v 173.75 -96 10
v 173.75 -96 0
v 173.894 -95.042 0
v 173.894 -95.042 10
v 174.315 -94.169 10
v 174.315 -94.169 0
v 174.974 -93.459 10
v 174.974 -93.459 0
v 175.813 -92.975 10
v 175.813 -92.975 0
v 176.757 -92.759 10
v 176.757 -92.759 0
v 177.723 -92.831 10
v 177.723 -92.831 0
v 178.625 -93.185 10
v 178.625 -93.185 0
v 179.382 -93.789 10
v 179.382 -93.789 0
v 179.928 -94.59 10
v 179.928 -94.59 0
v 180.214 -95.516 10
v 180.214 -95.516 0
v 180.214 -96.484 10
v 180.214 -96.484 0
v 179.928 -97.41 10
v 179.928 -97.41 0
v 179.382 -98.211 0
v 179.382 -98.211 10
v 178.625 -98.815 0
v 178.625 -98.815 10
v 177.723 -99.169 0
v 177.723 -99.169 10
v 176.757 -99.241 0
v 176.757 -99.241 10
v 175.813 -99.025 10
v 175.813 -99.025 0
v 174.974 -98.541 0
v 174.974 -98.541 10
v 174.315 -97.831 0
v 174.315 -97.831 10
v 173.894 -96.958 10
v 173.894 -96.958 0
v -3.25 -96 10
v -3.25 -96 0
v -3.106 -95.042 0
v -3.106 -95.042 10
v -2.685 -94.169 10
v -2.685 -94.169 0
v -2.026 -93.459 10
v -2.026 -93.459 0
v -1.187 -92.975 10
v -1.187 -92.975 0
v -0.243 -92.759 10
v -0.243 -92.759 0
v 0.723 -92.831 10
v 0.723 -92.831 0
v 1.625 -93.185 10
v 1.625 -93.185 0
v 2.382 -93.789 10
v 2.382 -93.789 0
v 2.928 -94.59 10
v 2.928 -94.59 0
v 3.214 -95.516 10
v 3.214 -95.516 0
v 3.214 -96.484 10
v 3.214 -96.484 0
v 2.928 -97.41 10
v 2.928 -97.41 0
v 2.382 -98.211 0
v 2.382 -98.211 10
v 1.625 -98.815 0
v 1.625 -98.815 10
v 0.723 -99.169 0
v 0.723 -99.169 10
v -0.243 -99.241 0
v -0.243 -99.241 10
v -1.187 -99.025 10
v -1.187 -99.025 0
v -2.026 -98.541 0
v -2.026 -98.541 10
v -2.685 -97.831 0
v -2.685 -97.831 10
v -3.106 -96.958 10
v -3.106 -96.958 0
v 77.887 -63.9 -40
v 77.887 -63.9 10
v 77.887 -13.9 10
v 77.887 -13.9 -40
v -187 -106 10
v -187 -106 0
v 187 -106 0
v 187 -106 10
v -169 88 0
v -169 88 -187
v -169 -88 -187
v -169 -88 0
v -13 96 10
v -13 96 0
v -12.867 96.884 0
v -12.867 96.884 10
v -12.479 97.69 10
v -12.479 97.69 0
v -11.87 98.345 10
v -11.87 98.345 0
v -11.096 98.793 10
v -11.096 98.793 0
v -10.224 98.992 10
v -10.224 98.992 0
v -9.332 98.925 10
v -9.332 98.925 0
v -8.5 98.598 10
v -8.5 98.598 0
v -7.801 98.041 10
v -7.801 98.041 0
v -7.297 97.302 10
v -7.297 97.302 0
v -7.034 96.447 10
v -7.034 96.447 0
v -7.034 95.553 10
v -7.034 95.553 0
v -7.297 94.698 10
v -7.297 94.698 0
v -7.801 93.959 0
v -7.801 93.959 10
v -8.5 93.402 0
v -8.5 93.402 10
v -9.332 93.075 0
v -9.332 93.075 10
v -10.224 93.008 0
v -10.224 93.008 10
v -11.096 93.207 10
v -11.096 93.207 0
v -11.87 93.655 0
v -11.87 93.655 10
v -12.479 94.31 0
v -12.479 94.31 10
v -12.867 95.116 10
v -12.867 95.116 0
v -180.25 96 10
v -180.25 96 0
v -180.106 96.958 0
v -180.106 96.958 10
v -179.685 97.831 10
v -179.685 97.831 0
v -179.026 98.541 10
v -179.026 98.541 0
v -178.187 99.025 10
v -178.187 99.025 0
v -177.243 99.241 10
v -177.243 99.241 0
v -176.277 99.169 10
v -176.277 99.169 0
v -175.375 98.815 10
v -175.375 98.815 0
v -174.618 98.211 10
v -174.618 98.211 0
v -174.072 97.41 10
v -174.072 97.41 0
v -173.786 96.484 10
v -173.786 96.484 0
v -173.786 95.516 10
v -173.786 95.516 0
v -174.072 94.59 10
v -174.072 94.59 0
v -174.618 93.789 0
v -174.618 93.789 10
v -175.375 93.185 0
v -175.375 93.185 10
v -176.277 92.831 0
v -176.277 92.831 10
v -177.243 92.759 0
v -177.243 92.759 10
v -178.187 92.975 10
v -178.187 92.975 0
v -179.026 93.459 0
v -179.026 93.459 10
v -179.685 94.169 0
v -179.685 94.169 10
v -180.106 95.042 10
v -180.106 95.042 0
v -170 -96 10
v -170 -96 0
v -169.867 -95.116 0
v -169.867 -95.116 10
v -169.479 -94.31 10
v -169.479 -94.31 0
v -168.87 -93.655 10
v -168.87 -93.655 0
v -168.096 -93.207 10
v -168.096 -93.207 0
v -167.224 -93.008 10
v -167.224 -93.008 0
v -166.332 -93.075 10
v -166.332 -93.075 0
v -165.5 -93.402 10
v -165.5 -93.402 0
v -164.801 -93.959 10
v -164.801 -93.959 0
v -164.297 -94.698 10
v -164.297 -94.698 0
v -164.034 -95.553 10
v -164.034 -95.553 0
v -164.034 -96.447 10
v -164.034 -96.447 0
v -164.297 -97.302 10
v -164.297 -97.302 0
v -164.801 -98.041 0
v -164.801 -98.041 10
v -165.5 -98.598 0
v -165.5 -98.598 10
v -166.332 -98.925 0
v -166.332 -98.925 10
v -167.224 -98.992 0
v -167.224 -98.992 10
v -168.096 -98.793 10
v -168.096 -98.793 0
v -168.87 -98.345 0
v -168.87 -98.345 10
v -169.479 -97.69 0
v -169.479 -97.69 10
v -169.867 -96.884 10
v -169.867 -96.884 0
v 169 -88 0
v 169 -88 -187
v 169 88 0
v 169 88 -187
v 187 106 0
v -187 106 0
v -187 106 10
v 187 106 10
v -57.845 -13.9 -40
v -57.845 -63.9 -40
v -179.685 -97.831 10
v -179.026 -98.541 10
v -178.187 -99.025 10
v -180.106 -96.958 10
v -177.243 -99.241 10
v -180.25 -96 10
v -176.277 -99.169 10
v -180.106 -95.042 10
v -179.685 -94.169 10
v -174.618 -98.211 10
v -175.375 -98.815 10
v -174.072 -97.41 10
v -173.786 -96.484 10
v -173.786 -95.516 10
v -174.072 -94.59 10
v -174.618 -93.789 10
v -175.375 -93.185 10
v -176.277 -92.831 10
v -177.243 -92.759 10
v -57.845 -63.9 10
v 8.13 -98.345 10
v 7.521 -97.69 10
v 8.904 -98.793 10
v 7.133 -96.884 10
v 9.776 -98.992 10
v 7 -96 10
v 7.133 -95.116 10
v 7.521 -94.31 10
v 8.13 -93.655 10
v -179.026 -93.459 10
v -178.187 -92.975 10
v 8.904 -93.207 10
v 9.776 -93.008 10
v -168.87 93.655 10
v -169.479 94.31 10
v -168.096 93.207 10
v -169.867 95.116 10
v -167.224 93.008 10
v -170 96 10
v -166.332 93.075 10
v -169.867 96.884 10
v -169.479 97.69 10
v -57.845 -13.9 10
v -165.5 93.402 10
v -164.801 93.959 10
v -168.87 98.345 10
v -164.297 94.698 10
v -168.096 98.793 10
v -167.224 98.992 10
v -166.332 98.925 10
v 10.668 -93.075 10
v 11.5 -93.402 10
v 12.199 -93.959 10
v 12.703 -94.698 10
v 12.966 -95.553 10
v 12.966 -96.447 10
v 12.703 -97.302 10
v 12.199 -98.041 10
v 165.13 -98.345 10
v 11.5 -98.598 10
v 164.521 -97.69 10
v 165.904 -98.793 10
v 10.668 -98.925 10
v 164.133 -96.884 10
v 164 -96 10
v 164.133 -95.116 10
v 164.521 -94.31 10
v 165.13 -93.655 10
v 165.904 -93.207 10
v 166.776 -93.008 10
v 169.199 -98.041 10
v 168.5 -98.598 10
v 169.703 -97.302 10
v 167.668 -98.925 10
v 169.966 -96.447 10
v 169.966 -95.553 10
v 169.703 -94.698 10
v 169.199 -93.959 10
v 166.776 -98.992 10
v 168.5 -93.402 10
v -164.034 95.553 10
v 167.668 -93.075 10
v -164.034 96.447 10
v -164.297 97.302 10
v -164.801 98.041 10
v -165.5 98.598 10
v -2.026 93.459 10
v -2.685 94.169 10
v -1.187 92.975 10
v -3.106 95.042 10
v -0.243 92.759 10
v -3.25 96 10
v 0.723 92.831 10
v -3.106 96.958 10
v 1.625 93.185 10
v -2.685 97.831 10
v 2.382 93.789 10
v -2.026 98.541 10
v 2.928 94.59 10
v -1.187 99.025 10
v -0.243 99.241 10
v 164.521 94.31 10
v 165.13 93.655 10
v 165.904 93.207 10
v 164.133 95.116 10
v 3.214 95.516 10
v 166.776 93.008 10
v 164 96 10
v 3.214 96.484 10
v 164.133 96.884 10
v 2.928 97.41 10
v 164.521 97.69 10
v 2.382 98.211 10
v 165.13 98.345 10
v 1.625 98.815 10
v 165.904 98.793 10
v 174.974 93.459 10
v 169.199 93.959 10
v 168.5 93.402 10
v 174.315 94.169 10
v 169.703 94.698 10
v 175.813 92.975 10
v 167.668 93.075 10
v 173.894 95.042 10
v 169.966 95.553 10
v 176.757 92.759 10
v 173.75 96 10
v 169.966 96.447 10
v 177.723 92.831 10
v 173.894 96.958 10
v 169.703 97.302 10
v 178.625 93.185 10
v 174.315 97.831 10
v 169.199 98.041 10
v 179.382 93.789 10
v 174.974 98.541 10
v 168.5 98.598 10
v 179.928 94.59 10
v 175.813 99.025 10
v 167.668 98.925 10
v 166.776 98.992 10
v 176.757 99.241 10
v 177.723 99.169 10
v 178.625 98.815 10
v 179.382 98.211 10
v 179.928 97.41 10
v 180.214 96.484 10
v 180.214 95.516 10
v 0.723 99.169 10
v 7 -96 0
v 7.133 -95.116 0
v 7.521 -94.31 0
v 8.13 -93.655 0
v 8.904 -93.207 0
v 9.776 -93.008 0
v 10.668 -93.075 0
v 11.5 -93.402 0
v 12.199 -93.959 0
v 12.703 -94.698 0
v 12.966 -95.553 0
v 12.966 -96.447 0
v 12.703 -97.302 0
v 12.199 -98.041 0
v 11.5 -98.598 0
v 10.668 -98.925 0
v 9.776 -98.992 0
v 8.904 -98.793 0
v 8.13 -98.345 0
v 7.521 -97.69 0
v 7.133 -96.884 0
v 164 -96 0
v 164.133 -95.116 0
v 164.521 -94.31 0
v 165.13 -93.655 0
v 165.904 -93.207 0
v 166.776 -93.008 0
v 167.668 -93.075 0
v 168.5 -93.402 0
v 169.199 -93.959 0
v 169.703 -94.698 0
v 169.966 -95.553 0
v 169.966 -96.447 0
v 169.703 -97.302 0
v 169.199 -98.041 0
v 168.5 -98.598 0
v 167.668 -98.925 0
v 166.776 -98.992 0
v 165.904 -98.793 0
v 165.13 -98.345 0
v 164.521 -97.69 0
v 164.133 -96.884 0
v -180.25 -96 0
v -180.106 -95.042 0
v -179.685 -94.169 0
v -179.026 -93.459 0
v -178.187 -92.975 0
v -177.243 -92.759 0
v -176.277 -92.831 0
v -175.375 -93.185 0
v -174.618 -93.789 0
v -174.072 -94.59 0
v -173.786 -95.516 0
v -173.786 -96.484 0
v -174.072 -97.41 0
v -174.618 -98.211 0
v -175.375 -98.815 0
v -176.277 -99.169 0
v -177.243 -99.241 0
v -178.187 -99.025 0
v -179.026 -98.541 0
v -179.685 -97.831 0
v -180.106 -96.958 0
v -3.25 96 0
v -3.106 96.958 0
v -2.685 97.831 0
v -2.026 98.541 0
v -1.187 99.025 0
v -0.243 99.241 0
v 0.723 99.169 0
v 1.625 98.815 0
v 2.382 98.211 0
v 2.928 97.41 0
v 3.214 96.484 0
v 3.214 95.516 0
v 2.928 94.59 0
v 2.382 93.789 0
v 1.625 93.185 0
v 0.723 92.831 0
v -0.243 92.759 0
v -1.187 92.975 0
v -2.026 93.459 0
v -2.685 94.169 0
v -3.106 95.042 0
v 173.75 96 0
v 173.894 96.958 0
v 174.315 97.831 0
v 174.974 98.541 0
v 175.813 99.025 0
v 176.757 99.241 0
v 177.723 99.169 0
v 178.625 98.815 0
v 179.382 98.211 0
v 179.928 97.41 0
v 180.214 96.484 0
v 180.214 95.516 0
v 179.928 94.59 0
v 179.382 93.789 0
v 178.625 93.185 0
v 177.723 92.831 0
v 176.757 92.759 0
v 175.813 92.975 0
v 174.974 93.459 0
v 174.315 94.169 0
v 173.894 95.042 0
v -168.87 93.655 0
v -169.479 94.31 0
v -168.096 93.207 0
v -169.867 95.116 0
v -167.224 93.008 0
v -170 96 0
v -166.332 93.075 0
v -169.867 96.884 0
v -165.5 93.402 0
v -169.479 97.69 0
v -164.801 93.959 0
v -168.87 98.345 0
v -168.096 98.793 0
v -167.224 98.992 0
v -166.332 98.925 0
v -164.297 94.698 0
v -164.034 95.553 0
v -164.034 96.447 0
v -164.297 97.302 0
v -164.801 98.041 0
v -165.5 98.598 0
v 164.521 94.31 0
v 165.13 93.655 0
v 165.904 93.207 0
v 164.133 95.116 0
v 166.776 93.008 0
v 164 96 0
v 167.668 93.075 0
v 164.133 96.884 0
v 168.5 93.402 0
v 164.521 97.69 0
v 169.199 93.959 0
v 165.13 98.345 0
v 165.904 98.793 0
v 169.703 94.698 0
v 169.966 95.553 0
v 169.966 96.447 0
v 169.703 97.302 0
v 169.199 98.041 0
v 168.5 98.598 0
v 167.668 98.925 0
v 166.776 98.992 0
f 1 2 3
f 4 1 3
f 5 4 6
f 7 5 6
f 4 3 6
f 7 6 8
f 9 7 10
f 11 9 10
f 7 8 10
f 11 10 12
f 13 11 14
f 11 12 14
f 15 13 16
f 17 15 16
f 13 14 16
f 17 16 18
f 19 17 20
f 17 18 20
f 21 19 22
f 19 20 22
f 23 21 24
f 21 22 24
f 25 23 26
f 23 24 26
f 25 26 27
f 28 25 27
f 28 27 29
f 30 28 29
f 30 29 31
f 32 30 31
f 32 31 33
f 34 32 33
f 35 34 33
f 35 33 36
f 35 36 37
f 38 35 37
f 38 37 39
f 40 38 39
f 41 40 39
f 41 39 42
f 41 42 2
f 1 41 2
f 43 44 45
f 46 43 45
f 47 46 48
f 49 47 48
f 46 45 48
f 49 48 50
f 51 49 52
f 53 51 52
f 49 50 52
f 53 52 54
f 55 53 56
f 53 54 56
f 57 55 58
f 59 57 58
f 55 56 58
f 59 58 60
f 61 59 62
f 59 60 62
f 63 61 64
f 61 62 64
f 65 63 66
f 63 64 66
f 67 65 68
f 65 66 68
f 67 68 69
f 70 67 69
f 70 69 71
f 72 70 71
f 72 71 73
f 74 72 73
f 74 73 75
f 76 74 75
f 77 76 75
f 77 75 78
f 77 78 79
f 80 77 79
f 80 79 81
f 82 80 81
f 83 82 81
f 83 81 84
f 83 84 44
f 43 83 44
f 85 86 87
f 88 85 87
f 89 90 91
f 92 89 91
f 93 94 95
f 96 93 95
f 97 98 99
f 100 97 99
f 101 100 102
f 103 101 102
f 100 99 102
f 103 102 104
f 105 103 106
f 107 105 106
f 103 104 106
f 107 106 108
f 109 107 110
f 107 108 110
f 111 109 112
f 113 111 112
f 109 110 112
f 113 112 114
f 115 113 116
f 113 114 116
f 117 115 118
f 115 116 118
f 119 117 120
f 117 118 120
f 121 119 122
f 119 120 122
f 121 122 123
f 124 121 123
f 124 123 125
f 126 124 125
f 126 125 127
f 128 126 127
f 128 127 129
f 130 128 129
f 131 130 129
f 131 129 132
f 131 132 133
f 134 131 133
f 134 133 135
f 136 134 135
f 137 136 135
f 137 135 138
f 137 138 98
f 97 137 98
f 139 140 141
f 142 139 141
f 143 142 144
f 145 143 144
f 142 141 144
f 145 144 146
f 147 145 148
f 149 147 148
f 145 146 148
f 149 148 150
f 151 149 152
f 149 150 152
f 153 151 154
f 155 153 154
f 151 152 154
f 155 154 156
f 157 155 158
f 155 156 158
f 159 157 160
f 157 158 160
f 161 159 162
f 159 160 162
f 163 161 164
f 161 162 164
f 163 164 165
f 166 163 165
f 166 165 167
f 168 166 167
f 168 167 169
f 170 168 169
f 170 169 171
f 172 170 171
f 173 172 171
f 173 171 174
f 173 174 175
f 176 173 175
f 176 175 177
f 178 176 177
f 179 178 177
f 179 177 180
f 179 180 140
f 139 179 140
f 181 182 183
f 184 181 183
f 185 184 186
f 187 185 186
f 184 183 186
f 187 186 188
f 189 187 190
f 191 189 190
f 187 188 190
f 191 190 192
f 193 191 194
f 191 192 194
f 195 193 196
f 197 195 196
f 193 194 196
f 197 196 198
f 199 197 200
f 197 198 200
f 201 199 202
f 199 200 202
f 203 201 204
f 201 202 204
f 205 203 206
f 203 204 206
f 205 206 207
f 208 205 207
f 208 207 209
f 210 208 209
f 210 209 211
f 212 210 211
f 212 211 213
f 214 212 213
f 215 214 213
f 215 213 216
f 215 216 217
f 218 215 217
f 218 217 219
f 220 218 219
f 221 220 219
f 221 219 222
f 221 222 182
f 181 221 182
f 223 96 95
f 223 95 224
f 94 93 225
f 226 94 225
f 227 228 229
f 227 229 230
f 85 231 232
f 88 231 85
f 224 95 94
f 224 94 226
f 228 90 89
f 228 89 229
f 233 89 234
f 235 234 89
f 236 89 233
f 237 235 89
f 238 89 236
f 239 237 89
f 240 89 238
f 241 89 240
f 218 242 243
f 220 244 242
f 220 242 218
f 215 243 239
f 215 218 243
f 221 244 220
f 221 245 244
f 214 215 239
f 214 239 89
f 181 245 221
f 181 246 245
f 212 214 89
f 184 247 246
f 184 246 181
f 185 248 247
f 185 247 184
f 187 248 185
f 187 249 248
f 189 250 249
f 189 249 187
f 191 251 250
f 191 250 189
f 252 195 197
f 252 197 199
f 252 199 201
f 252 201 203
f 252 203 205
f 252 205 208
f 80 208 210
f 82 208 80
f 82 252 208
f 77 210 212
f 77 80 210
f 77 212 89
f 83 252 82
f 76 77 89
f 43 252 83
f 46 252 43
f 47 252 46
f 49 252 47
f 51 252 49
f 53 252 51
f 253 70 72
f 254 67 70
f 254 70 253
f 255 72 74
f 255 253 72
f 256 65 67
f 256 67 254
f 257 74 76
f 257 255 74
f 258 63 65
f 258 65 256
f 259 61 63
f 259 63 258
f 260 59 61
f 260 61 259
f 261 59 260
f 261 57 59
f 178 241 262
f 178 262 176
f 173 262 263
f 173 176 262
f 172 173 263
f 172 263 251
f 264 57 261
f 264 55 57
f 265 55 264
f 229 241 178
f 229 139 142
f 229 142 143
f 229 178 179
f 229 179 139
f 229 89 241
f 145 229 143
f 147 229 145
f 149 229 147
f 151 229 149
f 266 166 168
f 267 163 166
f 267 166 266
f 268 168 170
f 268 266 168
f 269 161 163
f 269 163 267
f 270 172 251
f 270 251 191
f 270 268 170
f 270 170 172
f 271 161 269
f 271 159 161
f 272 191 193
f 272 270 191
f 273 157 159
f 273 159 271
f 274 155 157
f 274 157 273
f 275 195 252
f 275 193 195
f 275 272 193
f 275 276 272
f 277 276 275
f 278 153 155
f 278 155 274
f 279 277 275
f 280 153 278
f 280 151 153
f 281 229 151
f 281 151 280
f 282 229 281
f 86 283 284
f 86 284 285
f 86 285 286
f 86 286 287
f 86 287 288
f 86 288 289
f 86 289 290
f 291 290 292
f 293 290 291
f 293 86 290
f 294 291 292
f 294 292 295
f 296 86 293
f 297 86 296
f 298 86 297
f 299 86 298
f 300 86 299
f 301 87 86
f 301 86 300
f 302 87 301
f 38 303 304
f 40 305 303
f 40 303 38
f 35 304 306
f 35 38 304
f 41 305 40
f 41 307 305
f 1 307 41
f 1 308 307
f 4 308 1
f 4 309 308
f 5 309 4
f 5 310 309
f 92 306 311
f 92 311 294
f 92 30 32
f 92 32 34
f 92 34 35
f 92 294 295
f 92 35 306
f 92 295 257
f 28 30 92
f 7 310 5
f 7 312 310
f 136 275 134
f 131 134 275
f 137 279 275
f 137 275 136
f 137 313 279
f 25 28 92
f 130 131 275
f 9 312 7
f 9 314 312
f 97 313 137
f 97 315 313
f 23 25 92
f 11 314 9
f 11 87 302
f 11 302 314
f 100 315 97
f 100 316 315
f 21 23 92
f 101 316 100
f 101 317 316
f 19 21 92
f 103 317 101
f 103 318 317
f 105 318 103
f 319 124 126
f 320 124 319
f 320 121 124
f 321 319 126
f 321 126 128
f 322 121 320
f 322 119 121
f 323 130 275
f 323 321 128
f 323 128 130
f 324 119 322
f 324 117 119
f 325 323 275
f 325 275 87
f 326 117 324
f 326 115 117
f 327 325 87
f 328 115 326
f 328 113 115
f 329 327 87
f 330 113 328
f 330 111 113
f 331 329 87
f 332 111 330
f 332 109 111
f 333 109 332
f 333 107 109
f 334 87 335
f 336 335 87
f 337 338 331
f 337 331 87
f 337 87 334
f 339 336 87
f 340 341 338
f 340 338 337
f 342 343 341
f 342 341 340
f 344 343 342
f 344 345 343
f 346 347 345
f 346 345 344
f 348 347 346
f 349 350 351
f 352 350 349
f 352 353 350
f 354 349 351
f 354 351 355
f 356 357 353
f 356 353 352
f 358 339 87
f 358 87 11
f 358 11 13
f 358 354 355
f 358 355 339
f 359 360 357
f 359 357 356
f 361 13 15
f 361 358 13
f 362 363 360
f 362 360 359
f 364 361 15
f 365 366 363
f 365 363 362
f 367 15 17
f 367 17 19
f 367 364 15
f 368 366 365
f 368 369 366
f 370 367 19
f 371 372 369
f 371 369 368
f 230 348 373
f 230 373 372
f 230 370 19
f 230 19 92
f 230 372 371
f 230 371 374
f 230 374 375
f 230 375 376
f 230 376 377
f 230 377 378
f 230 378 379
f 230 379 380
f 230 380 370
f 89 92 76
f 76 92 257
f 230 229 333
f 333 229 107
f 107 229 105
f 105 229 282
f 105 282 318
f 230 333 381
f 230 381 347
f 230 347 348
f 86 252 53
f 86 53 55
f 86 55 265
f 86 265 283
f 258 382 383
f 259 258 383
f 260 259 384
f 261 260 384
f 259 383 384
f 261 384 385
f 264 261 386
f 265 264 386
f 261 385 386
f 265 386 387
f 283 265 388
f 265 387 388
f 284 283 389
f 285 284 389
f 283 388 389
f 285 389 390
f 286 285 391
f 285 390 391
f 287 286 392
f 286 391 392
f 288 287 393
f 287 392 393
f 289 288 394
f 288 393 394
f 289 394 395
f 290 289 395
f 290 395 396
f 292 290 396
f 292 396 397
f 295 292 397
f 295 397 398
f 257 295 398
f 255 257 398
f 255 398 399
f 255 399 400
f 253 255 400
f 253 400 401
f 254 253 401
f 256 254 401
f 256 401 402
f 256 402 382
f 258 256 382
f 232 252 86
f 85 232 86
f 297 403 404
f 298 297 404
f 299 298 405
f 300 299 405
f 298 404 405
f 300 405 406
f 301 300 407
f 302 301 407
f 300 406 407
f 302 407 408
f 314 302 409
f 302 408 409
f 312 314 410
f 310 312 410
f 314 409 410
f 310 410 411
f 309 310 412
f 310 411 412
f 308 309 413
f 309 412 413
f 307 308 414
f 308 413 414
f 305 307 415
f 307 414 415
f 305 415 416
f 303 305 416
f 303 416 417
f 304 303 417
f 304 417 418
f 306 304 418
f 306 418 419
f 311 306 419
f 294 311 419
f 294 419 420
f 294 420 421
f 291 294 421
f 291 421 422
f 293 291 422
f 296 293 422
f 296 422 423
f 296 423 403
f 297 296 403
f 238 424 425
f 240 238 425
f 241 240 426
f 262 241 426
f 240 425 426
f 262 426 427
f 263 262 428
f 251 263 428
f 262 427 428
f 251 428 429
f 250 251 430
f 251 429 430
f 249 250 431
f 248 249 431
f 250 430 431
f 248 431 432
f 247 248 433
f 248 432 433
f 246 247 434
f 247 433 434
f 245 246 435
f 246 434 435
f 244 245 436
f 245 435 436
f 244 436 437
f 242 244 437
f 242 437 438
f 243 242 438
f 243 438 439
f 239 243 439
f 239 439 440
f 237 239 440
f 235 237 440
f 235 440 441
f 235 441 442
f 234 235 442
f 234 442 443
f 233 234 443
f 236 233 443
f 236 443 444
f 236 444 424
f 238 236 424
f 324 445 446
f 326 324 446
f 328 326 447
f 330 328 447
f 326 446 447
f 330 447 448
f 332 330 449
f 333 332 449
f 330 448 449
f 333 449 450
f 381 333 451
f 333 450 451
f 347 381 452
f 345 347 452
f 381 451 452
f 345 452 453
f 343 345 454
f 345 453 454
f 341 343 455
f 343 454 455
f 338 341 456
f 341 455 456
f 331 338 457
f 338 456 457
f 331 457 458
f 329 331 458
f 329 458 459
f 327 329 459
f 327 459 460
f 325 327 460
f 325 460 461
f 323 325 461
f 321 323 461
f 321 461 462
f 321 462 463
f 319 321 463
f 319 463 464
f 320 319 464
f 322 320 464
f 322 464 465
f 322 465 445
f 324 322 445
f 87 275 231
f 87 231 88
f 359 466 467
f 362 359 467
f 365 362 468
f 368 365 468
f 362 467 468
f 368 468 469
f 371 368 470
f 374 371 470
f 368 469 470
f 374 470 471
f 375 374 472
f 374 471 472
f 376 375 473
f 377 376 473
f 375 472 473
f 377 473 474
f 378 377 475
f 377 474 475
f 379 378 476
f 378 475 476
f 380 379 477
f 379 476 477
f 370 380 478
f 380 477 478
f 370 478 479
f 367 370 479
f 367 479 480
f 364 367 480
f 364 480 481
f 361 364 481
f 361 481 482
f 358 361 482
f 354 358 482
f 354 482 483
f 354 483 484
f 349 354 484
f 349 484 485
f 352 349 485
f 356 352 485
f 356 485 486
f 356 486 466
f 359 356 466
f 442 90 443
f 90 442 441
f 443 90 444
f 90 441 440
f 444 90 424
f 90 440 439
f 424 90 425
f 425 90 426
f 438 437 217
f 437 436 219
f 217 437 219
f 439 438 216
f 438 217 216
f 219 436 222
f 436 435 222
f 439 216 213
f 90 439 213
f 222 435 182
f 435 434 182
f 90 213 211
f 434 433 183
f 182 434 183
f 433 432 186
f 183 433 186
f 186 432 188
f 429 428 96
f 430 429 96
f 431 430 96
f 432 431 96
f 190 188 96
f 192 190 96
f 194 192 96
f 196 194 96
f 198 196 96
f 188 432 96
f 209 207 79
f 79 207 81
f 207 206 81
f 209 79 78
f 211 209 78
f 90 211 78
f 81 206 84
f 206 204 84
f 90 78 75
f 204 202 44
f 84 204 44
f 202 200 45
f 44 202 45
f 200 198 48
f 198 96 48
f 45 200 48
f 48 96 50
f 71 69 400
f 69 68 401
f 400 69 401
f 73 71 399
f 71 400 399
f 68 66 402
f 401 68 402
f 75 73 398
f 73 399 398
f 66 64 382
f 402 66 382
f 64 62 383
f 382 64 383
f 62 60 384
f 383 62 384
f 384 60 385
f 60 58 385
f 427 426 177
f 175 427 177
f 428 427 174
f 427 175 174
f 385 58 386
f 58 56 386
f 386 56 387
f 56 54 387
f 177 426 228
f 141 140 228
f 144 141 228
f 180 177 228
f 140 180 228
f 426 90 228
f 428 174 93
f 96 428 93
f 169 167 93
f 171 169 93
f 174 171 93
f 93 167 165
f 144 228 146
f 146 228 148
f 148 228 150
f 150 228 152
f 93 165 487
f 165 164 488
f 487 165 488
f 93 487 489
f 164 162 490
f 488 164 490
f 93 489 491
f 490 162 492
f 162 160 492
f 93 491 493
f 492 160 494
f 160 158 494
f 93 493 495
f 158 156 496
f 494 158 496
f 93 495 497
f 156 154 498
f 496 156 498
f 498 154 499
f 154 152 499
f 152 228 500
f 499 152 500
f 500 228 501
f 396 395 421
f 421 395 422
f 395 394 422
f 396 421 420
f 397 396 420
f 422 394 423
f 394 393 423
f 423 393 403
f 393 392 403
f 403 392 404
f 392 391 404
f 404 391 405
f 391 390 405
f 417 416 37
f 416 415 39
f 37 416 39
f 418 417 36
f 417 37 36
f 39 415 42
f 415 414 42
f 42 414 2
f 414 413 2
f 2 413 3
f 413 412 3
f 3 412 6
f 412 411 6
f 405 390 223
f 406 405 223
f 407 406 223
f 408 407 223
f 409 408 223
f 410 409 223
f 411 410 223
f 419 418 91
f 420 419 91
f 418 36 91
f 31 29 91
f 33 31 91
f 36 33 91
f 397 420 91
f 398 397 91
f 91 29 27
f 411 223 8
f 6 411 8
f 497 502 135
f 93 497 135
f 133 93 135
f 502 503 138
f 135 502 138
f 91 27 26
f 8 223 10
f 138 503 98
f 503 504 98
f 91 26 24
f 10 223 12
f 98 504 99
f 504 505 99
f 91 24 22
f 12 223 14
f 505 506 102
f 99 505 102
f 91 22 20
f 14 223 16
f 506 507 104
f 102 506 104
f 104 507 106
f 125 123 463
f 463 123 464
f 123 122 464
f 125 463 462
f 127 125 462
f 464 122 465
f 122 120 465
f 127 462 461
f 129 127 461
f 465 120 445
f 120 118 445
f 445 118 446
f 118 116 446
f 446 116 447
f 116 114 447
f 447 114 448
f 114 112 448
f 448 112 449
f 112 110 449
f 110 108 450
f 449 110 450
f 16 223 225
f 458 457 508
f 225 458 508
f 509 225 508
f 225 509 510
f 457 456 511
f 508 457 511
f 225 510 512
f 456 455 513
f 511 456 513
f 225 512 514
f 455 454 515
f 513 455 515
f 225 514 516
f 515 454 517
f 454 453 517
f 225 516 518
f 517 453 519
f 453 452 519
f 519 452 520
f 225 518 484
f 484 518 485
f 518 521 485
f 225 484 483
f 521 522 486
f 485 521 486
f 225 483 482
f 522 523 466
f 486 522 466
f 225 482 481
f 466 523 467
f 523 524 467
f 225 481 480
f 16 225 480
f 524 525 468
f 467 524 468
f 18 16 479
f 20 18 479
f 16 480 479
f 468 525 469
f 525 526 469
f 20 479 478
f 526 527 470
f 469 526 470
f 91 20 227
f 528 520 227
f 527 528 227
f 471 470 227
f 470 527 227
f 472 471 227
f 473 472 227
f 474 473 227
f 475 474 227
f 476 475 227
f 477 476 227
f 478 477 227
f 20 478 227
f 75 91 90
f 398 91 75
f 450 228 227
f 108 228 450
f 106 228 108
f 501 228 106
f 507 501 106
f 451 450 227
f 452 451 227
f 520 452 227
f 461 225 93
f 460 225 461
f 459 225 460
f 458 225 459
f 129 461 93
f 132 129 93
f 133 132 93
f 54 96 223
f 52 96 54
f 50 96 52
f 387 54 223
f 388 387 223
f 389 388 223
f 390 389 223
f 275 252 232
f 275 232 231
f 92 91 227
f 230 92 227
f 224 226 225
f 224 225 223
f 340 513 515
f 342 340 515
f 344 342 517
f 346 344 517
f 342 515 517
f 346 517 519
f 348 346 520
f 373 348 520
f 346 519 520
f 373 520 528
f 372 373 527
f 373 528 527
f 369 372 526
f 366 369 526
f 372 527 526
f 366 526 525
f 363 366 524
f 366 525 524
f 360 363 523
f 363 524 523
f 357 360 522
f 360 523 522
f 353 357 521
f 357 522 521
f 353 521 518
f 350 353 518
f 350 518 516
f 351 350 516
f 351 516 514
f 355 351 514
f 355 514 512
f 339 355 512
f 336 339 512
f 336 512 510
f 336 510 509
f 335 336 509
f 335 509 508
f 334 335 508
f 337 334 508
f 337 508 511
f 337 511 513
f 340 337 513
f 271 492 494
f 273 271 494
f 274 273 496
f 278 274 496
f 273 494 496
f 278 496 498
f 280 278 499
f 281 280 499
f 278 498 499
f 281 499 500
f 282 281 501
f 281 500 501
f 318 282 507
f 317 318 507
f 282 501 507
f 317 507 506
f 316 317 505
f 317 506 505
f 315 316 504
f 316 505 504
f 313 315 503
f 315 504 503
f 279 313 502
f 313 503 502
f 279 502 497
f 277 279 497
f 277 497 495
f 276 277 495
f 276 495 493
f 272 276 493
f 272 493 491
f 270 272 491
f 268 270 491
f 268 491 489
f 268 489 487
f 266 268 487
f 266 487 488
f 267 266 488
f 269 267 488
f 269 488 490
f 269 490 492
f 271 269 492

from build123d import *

# Parameters (mm, degrees)
F0_W     = 374
F0_H     = 212
F1_DEPTH = 10
F2_W     = 338
F2_H     = 176
F3_DEPTH = 187
F4_W     = 135.732657
F4_H     = 50
F5_DEPTH = 50
F7_D     = 6
F7_DEPTH = 10
F8_D     = 6.5
F8_DEPTH = 10


with BuildPart() as f1:
    # F0 (on Top) → F1 (new body)
    with BuildSketch(Plane.XY):
        Rectangle(F0_W, F0_H)
    extrude(amount=F1_DEPTH)

    # F2 (on face) → F3 (join)
    with BuildSketch(Plane(origin=(0, 0, 0), x_dir=(1, 0, 0), z_dir=(0, 0, -1))):
        Rectangle(F2_W, F2_H)
    extrude(amount=F3_DEPTH)

    # F4 (on face) → F5 (cut)
    with BuildSketch(Plane.XY.offset(10)):
        with Locations((10.02105, -38.9)):
            Rectangle(F4_W, F4_H)
    extrude(amount=-F5_DEPTH, mode=Mode.SUBTRACT)

    # F7
    with Locations(Plane.XY.offset(10)):
        with Locations((-167, 96), (-167, -96), (167, -96), (167, 96), (-10, 96), (10, -96)):
            Hole(F7_D / 2, depth=F7_DEPTH)

    # F8
    with Locations(Plane.XY.offset(10)):
        with Locations((-177, 96), (-177, -96), (0, -96), (0, 96), (177, 96), (177, -96)):
            Hole(F8_D / 2, depth=F8_DEPTH)


solid = f1.part
